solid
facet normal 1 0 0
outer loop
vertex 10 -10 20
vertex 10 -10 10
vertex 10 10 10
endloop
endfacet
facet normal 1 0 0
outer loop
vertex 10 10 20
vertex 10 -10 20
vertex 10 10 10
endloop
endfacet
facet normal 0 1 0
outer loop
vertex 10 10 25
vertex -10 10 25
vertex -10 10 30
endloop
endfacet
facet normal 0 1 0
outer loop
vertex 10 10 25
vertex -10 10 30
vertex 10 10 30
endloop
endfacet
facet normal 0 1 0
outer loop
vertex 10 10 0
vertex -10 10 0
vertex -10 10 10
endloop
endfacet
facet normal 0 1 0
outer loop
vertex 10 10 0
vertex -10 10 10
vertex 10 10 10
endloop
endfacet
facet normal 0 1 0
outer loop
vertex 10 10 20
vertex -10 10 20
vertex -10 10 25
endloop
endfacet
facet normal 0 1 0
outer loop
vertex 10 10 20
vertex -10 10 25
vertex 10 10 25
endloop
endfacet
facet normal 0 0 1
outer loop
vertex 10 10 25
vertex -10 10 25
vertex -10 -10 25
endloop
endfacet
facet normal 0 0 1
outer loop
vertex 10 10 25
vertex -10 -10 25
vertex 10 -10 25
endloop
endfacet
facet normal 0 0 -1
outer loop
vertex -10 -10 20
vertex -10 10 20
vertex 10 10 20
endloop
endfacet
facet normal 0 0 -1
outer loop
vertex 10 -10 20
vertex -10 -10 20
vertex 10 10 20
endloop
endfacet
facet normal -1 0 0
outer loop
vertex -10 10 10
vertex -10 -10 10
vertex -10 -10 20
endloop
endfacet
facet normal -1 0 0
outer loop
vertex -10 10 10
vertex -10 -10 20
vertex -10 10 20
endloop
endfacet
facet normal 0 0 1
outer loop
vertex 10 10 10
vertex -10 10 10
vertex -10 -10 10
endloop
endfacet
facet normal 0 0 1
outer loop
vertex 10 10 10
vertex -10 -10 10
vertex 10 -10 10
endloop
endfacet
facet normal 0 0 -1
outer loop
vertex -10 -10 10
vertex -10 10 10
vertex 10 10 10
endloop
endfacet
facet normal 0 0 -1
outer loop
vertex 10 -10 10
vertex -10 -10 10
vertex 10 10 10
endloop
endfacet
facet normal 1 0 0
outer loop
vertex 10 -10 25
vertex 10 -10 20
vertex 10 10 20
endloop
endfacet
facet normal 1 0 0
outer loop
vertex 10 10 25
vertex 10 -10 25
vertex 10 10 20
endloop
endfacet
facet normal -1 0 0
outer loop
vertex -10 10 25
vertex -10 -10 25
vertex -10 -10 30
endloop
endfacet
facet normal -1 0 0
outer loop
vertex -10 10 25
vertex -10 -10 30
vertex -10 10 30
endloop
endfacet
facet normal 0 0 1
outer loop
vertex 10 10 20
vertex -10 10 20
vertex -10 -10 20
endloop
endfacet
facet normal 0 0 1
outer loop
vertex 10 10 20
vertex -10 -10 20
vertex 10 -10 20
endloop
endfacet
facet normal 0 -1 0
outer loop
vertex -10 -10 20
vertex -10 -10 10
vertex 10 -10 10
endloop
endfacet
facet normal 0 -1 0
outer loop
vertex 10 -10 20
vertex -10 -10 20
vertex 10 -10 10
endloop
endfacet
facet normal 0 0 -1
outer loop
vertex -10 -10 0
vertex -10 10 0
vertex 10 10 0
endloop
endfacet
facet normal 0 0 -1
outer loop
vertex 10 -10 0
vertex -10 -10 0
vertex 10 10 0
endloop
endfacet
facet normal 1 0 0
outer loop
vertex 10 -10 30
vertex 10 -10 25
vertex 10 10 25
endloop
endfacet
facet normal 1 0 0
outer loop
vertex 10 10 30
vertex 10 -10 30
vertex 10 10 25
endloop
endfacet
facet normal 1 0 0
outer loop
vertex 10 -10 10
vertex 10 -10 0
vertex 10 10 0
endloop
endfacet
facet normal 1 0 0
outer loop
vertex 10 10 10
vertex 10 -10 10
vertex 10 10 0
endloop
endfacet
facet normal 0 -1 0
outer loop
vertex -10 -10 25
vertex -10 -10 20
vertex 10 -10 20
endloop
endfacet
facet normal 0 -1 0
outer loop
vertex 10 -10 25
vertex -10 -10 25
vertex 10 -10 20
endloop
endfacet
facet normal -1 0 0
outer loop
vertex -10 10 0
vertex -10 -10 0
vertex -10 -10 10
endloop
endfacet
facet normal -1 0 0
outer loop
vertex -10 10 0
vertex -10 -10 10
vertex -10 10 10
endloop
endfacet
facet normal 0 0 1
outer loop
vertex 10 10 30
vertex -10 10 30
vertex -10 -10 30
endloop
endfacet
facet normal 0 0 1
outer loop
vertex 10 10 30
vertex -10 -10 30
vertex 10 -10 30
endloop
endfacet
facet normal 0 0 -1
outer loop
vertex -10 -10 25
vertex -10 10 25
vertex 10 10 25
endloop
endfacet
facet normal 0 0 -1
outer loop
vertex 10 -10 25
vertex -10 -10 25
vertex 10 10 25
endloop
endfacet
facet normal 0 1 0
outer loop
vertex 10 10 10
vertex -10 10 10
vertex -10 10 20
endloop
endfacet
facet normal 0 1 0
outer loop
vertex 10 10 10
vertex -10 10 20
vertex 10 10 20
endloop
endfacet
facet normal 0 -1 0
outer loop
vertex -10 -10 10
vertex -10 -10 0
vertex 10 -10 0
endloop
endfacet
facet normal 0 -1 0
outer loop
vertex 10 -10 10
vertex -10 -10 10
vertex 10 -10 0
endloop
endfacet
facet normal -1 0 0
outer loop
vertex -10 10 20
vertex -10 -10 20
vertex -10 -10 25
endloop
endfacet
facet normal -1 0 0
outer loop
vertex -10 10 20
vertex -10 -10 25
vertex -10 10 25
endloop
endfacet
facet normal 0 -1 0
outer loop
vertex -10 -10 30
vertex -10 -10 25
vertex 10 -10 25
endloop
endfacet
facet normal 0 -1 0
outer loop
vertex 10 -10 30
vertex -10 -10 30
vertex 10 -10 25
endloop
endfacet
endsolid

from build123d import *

# Parameters (mm, degrees)
F0_W     = 20
F0_H     = 20
F1_DEPTH = 10
F2_DEPTH = 10
F3_DEPTH = 5
F4_DEPTH = 5


with BuildPart() as f1:
    # F0 (on Top) → F1 (new body)
    with BuildSketch(Plane.XY):
        Rectangle(F0_W, F0_H)
    extrude(amount=F1_DEPTH)


with BuildPart() as f2:
    # F2 (new): a face of the model
    f2_faces = [f1.part.faces().sort_by_distance(p)[0] for p in [
        (0, 0, 10),
    ]]
    extrude(f2_faces, amount=F2_DEPTH)


with BuildPart() as f3:
    # F3 (new): a face of the model
    f3_faces = [f2.part.faces().sort_by_distance(p)[0] for p in [
        (0, 0, 20),
    ]]
    extrude(f3_faces, amount=F3_DEPTH)


with BuildPart() as f4:
    # F4 (new): a face of the model
    f4_faces = [f3.part.faces().sort_by_distance(p)[0] for p in [
        (0, 0, 25),
    ]]
    extrude(f4_faces, amount=F4_DEPTH)


solid = Compound([f1.part, f2.part, f3.part, f4.part])
